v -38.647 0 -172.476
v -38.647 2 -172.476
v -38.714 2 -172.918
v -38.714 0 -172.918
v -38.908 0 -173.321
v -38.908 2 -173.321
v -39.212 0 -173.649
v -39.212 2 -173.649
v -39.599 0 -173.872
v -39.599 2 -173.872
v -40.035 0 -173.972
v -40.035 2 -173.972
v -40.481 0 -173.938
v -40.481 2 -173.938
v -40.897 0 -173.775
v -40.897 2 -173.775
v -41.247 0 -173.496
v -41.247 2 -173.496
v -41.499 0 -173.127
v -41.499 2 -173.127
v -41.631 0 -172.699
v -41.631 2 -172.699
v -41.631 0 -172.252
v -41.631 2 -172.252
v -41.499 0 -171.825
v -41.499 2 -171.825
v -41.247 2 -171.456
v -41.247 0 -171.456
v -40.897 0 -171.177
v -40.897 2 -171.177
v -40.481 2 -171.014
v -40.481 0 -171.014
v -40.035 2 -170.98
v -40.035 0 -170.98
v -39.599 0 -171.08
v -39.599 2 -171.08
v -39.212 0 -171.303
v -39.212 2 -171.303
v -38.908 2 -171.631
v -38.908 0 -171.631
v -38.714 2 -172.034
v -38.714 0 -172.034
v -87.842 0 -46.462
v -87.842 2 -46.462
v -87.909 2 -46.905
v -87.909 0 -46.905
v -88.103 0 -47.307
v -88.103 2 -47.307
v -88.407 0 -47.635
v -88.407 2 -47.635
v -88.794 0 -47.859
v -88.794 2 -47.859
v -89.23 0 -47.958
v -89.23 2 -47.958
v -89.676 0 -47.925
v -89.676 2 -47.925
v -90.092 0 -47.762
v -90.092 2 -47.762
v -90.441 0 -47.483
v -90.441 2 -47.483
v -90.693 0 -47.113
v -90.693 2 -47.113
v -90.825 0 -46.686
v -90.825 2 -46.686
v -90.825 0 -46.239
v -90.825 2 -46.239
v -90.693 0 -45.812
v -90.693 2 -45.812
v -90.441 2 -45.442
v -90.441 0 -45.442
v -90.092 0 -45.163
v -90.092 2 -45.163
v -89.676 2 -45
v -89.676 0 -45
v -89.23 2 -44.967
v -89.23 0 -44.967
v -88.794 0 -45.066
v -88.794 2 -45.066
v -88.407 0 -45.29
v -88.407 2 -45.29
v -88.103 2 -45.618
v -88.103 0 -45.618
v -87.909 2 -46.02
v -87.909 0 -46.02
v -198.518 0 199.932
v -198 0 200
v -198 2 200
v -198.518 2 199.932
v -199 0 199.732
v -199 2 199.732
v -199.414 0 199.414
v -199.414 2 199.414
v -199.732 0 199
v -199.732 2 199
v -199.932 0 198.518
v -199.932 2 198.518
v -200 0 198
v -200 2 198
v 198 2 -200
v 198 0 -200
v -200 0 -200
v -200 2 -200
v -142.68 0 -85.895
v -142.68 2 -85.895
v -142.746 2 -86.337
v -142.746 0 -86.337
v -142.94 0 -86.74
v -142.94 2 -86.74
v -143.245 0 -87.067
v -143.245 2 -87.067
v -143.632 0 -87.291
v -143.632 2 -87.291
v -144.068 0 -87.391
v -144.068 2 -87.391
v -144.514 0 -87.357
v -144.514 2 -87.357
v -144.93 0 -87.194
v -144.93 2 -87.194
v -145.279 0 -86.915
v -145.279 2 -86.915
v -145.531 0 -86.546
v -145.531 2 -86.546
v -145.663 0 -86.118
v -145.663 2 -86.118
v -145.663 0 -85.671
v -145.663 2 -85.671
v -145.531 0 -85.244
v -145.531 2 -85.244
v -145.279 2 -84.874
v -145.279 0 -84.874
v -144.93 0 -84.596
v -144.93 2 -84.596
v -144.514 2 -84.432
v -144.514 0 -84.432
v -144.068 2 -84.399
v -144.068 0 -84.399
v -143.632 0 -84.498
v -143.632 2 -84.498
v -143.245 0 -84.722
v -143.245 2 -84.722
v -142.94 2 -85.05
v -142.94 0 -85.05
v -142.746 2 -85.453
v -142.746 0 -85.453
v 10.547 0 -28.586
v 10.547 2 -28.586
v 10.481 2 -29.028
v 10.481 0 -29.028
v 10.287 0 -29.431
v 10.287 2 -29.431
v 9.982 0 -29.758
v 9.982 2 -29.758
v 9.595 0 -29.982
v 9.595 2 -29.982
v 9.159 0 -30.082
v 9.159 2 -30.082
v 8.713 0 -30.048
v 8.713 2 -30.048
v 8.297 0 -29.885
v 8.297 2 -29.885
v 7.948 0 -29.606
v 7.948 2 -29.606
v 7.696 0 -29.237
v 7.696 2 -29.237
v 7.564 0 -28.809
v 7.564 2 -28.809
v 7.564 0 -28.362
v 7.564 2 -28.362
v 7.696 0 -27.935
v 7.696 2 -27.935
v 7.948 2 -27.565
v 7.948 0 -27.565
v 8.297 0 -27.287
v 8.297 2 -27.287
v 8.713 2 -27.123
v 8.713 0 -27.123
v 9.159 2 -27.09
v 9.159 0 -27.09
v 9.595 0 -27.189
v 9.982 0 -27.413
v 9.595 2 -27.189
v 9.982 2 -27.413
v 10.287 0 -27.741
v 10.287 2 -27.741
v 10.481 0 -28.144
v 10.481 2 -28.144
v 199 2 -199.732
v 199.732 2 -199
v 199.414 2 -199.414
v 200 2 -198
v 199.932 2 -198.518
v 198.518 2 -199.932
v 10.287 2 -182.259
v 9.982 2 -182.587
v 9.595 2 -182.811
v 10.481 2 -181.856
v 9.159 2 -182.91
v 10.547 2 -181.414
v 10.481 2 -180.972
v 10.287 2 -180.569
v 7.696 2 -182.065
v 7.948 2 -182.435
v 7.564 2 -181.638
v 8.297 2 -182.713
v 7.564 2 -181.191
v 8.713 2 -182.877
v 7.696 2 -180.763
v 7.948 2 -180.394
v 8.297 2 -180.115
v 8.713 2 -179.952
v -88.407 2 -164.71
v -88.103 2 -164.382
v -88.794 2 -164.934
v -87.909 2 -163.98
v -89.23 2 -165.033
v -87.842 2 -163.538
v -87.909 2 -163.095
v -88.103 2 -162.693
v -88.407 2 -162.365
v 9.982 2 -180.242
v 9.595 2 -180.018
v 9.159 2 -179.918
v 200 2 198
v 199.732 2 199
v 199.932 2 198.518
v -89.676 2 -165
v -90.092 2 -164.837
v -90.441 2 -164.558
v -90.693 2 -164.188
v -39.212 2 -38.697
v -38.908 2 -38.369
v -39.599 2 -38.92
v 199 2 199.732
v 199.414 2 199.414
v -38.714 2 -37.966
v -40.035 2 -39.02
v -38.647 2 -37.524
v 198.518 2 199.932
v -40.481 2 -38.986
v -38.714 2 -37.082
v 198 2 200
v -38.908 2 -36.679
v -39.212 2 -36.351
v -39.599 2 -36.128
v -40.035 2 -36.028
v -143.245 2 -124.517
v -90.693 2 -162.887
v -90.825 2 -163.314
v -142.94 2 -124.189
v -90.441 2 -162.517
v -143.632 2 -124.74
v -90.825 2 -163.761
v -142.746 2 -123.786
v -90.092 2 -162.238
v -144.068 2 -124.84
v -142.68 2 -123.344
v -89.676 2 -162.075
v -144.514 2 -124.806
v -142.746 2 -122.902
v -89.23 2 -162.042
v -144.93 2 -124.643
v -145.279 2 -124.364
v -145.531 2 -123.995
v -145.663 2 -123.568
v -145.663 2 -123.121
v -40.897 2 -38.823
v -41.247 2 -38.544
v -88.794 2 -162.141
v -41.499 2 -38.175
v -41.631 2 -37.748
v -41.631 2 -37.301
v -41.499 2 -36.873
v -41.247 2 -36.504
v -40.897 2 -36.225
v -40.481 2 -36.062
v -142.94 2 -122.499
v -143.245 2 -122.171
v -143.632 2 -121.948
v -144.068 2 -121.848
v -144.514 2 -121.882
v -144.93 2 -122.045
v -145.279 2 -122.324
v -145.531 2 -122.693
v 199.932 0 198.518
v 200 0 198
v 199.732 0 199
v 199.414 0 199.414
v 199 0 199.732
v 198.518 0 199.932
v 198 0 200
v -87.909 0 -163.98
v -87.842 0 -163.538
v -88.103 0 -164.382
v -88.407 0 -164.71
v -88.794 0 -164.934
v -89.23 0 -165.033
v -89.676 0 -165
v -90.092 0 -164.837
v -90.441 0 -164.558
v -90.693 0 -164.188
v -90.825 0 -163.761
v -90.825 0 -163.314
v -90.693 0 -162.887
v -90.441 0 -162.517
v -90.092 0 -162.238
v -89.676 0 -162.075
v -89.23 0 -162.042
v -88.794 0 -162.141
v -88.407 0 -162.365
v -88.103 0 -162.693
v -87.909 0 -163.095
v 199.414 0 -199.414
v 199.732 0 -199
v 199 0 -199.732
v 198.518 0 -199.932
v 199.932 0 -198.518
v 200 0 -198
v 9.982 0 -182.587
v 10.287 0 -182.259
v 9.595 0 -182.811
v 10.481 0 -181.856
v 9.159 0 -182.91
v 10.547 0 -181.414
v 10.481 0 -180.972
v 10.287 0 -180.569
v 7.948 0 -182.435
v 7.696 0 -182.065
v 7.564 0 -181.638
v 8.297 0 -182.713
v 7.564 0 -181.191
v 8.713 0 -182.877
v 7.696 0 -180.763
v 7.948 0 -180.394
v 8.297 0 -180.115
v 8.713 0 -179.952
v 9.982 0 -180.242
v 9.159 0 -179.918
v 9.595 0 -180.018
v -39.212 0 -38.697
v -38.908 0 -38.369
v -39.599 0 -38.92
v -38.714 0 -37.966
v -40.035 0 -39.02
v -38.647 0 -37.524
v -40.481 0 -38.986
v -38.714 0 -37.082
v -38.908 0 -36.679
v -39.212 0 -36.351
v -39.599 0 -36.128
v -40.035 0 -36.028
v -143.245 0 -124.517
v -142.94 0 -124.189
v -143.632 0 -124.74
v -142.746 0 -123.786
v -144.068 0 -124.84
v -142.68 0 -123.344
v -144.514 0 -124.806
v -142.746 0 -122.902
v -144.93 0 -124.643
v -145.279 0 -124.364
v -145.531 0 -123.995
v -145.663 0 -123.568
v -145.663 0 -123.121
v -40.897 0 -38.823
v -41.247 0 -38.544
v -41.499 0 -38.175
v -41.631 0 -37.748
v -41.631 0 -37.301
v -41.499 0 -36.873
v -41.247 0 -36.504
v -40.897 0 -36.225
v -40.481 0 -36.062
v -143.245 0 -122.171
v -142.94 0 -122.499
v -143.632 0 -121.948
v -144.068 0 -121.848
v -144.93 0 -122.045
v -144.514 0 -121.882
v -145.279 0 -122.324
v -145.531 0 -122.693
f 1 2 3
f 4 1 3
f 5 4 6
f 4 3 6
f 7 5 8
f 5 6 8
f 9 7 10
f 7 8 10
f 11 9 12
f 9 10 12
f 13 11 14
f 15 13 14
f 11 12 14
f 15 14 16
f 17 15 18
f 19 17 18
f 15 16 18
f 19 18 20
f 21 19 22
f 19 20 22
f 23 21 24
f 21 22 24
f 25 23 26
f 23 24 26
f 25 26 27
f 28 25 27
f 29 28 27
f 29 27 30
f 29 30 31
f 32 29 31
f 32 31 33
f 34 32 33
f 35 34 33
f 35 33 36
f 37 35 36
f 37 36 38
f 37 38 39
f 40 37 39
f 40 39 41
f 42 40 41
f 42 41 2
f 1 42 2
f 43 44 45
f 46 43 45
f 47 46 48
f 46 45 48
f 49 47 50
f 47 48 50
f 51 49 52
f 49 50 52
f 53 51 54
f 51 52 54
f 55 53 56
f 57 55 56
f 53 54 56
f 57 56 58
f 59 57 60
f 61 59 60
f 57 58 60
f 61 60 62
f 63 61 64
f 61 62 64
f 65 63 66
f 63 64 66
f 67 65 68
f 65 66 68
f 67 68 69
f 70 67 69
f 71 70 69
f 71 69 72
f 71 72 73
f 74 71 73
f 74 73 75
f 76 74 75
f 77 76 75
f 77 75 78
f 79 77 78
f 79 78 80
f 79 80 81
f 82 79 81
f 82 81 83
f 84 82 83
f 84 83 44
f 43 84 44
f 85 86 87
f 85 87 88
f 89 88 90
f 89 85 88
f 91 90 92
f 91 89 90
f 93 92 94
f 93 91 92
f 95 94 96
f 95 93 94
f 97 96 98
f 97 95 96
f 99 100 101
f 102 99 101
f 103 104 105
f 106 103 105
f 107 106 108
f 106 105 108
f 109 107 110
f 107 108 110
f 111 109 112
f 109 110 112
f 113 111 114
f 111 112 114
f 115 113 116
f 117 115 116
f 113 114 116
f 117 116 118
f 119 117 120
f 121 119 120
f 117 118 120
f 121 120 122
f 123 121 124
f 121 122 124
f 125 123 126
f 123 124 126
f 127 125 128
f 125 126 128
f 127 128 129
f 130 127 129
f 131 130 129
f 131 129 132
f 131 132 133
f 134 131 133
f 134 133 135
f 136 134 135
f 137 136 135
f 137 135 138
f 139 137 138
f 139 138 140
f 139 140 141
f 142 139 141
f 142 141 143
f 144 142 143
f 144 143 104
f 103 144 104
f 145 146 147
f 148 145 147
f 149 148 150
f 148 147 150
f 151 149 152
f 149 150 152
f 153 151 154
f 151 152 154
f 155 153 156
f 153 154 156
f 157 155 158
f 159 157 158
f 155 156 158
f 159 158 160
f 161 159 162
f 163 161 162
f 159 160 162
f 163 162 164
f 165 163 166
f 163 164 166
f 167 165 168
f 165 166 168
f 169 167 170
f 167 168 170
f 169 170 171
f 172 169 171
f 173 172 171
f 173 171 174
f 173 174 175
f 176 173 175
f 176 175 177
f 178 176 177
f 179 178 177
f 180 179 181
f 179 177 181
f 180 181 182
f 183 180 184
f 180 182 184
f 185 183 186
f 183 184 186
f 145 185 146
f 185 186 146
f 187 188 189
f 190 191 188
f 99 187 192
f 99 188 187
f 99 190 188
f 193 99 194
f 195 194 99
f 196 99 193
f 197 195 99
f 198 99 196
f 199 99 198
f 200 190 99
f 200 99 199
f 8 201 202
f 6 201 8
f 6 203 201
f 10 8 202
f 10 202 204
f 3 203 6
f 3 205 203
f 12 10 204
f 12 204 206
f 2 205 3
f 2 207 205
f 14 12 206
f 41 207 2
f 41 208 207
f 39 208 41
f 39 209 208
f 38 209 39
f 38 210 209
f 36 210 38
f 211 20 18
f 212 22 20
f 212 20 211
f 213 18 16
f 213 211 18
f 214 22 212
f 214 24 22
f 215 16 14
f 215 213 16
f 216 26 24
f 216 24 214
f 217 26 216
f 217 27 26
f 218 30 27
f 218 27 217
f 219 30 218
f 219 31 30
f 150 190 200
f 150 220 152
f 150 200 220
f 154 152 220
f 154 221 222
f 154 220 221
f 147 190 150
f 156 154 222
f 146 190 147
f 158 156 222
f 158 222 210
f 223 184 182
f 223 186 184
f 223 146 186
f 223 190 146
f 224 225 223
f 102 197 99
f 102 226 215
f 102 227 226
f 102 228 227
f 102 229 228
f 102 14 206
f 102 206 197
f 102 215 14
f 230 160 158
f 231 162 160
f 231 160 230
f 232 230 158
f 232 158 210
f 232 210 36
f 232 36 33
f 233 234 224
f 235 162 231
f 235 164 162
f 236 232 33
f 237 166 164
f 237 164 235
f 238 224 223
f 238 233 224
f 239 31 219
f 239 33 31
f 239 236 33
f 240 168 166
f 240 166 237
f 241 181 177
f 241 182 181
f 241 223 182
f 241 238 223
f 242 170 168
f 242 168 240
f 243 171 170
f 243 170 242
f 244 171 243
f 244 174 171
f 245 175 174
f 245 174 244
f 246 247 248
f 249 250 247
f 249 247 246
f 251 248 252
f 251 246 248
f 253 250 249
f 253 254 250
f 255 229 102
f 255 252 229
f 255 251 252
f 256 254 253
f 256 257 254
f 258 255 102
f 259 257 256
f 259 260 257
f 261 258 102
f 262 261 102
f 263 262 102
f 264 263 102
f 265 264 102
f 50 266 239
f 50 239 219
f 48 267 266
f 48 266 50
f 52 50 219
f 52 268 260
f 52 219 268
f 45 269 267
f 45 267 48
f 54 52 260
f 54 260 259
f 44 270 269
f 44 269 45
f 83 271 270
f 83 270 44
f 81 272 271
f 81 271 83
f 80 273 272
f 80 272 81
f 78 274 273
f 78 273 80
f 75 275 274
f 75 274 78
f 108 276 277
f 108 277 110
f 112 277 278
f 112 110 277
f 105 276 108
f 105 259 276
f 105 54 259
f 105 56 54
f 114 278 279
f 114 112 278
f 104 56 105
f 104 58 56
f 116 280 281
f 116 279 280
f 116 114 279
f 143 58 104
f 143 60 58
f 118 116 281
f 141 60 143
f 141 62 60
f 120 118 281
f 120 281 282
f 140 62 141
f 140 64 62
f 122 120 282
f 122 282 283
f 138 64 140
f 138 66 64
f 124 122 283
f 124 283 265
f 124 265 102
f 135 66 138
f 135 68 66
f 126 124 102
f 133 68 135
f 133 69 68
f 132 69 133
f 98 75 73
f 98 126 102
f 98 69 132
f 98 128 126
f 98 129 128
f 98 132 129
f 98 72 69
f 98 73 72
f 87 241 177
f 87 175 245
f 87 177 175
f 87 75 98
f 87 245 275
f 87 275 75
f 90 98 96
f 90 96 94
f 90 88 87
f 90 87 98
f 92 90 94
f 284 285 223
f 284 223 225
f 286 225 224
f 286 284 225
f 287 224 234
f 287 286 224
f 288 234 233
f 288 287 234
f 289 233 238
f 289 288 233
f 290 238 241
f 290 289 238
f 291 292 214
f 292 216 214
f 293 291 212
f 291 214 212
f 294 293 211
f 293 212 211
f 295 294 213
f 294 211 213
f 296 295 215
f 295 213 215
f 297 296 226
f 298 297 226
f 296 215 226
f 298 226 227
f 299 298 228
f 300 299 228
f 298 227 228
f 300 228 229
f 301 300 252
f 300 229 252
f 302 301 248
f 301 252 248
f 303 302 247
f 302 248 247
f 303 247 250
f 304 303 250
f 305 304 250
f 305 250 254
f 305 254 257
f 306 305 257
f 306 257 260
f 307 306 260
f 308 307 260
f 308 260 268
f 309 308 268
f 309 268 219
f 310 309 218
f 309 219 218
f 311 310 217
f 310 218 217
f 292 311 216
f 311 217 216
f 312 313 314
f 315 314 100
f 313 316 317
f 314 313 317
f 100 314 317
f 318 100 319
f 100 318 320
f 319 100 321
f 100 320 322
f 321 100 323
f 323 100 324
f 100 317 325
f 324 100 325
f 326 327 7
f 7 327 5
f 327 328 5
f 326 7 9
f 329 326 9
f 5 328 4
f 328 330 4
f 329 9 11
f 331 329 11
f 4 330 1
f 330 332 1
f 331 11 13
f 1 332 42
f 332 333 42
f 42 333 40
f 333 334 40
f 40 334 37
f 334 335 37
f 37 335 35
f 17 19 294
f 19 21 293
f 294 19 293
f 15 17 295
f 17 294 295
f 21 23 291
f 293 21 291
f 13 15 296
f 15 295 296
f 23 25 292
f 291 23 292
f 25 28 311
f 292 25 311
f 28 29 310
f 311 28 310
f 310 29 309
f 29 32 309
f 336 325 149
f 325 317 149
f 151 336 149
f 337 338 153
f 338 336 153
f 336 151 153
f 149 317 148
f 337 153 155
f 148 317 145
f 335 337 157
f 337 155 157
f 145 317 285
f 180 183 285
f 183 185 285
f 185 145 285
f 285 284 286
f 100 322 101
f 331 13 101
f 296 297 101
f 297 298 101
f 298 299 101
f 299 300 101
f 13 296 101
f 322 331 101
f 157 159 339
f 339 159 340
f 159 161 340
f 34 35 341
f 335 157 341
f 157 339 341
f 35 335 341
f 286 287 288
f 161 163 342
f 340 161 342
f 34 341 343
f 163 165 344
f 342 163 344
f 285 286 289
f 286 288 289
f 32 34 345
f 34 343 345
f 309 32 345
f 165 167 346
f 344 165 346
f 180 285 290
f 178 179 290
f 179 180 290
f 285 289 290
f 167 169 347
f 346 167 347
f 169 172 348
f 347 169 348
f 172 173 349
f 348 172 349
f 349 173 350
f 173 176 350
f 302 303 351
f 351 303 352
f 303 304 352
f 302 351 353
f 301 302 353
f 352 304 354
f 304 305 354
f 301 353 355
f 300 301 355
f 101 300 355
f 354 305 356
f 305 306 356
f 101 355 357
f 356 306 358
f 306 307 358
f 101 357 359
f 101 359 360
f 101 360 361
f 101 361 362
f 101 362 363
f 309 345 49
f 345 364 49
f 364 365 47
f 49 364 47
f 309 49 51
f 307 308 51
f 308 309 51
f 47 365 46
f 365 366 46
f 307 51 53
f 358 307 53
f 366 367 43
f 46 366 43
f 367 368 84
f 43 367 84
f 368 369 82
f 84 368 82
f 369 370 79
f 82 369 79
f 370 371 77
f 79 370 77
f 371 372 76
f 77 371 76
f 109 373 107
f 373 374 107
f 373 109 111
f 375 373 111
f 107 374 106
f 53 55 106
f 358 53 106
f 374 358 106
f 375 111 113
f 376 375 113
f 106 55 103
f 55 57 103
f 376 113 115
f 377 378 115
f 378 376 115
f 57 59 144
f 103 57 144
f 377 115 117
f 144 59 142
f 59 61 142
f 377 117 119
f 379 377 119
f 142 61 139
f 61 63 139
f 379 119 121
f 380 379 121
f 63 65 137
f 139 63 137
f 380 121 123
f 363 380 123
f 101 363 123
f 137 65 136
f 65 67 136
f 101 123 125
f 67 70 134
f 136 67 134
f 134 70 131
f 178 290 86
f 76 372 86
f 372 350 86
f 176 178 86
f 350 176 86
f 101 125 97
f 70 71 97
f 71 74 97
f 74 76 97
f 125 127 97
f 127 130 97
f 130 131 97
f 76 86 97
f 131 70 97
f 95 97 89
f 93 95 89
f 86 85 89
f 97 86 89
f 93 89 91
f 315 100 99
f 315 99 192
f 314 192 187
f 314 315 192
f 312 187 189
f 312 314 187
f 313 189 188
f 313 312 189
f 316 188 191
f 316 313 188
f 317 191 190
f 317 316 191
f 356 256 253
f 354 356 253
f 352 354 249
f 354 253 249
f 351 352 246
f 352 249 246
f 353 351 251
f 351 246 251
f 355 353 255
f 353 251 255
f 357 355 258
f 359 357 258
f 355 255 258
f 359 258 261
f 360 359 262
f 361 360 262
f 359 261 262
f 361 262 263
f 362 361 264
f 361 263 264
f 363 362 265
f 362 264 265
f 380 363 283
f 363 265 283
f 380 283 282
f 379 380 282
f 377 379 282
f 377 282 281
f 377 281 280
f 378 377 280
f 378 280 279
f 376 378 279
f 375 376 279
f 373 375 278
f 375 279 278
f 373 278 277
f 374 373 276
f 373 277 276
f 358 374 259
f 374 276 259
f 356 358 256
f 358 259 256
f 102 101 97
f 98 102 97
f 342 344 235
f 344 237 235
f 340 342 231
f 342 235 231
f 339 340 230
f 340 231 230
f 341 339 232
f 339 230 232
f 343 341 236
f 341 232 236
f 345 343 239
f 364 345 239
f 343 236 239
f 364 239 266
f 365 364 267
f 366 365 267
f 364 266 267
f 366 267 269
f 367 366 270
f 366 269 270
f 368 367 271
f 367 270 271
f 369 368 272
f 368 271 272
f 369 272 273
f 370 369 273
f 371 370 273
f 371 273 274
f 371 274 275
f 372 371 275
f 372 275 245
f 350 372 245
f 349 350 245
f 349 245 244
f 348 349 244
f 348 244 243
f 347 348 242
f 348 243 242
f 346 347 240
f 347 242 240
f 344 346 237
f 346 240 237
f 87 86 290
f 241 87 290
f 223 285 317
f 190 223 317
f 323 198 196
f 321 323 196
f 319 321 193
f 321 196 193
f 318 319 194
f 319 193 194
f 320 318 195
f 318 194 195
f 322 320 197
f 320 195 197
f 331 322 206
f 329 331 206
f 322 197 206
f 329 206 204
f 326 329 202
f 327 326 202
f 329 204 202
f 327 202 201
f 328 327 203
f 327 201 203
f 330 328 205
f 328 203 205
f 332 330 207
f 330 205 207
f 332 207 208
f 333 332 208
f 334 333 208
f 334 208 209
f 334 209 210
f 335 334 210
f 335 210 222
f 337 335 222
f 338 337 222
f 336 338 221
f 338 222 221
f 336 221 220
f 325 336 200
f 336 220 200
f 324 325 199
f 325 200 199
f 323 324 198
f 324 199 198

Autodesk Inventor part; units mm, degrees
ref_plane "YZ Plane" through (0, 0, 0) normal (1, 0, 0) x (0, 1, 0)
ref_plane "XZ Plane" through (0, 0, 0) normal (0, 1, 0) x (-1, 0, 0)
ref_plane "XY Plane" through (0, 0, 0) normal (0, 0, 1) x (1, 0, 0)
sketch "Sketch1" plane through (0, 0, 0) normal (0, 1, 0) x (-1, 0, 0)
  line L0 (198, 200) -> (-198, 200)
  line L1 (-200, 198) -> (-200, -198)
  line L2 (-198, -200) -> (200, -200)
  line L3 (200, -200) -> (200, 198)
  line L4 (200, 200) -> (-200, -200) construction
  line L5 (-200, 200) -> (200, -200) construction
  arc A0 (200, 198) -> (198, 200) centre (198, 198) ccw
  arc A1 (-198, 200) -> (-200, 198) centre (-198, 198) ccw
  arc A2 (-200, -198) -> (-198, -200) centre (-198, -198) ccw
  point P0 (0, 0)
  dimension "d0" = 400
  dimension "d1" = 400
  dimension "d2" = 2
extrude "Extrusion1" add sketch "Sketch1" along normal blind 2
sketch "Sketch2" plane through (0, 2, 0) normal (0, 1, 0) x (1, 0, 0)
  circle A0 centre (-89.3419, 163.5375) radius 1.5 projected
  line L0 (-84.9588, 167.383) -> (-94.7977, 165.5953) projected
  line L1 (-94.7977, 165.5953) -> (-93.7251, 159.692) projected
  line L2 (-93.7251, 159.692) -> (-83.8862, 161.4797) projected
  line L3 (-84.9588, 167.383) -> (-83.8862, 161.4797) projected
  circle A1 centre (-144.1798, 123.3441) radius 1.5 projected
  line L4 (-147.1798, 118.3441) -> (-147.1798, 128.3441) projected
  line L5 (-141.1798, 118.3441) -> (-147.1798, 118.3441) projected
  line L6 (-141.1798, 128.3441) -> (-141.1798, 118.3441) projected
  line L7 (-141.1798, 128.3441) -> (-147.1798, 128.3441) projected
  circle A2 centre (-144.1798, 85.8947) radius 1.5 projected
  line L8 (-147.1798, 80.8947) -> (-147.1798, 90.8947) projected
  line L9 (-147.1798, 80.8947) -> (-141.1798, 80.8947) projected
  line L10 (-141.1798, 90.8947) -> (-141.1798, 80.8947) projected
  line L11 (-147.1798, 90.8947) -> (-141.1798, 90.8947) projected
  circle A3 centre (-89.3419, 46.4625) radius 1.5 projected
  circle A4 centre (-89.3419, 46.4625) radius 1.5 projected
  line L12 (-84.9588, 42.617) -> (-94.7977, 44.4047) projected
  line L13 (-84.9588, 42.617) -> (-83.8862, 48.5203) projected
  line L14 (-93.7251, 50.308) -> (-83.8862, 48.5203) projected
  line L15 (-94.7977, 44.4047) -> (-93.7251, 50.308) projected
  circle A5 centre (-40.1474, 37.5241) radius 1.5 projected
  line L16 (-35.7642, 33.6786) -> (-45.6031, 35.4663) projected
  line L17 (-35.7642, 33.6786) -> (-34.6916, 39.5819) projected
  line L18 (-44.5305, 41.3696) -> (-34.6916, 39.5819) projected
  line L19 (-45.6031, 35.4663) -> (-44.5305, 41.3696) projected
  circle A6 centre (9.0472, 28.5857) radius 1.5 projected
  line L20 (13.4304, 24.7402) -> (3.5914, 26.5278) projected
  line L21 (13.4304, 24.7402) -> (14.503, 30.6435) projected
  line L22 (4.6641, 32.4312) -> (14.503, 30.6435) projected
  line L23 (3.5914, 26.5278) -> (4.6641, 32.4312) projected
  circle A7 centre (-40.1474, 172.4759) radius 1.5 projected
  line L24 (-35.7642, 176.3214) -> (-45.6031, 174.5337) projected
  line L25 (-45.6031, 174.5337) -> (-44.5305, 168.6304) projected
  line L26 (-44.5305, 168.6304) -> (-34.6916, 170.4181) projected
  line L27 (-35.7642, 176.3214) -> (-34.6916, 170.4181) projected
  circle A8 centre (9.0472, 181.4143) radius 1.5 projected
  line L28 (13.4304, 185.2598) -> (3.5914, 183.4722) projected
  line L29 (3.5914, 183.4722) -> (4.6641, 177.5688) projected
  line L30 (4.6641, 177.5688) -> (14.503, 179.3565) projected
  line L31 (13.4304, 185.2598) -> (14.503, 179.3565) projected
  point P0 (0, 0)
extrude "Extrusion2" cut sketch "Sketch2" against normal through all contours A0 | A1 | A2 | A3 | A5 | A6 | A7 | A8
properties part number "plate"
